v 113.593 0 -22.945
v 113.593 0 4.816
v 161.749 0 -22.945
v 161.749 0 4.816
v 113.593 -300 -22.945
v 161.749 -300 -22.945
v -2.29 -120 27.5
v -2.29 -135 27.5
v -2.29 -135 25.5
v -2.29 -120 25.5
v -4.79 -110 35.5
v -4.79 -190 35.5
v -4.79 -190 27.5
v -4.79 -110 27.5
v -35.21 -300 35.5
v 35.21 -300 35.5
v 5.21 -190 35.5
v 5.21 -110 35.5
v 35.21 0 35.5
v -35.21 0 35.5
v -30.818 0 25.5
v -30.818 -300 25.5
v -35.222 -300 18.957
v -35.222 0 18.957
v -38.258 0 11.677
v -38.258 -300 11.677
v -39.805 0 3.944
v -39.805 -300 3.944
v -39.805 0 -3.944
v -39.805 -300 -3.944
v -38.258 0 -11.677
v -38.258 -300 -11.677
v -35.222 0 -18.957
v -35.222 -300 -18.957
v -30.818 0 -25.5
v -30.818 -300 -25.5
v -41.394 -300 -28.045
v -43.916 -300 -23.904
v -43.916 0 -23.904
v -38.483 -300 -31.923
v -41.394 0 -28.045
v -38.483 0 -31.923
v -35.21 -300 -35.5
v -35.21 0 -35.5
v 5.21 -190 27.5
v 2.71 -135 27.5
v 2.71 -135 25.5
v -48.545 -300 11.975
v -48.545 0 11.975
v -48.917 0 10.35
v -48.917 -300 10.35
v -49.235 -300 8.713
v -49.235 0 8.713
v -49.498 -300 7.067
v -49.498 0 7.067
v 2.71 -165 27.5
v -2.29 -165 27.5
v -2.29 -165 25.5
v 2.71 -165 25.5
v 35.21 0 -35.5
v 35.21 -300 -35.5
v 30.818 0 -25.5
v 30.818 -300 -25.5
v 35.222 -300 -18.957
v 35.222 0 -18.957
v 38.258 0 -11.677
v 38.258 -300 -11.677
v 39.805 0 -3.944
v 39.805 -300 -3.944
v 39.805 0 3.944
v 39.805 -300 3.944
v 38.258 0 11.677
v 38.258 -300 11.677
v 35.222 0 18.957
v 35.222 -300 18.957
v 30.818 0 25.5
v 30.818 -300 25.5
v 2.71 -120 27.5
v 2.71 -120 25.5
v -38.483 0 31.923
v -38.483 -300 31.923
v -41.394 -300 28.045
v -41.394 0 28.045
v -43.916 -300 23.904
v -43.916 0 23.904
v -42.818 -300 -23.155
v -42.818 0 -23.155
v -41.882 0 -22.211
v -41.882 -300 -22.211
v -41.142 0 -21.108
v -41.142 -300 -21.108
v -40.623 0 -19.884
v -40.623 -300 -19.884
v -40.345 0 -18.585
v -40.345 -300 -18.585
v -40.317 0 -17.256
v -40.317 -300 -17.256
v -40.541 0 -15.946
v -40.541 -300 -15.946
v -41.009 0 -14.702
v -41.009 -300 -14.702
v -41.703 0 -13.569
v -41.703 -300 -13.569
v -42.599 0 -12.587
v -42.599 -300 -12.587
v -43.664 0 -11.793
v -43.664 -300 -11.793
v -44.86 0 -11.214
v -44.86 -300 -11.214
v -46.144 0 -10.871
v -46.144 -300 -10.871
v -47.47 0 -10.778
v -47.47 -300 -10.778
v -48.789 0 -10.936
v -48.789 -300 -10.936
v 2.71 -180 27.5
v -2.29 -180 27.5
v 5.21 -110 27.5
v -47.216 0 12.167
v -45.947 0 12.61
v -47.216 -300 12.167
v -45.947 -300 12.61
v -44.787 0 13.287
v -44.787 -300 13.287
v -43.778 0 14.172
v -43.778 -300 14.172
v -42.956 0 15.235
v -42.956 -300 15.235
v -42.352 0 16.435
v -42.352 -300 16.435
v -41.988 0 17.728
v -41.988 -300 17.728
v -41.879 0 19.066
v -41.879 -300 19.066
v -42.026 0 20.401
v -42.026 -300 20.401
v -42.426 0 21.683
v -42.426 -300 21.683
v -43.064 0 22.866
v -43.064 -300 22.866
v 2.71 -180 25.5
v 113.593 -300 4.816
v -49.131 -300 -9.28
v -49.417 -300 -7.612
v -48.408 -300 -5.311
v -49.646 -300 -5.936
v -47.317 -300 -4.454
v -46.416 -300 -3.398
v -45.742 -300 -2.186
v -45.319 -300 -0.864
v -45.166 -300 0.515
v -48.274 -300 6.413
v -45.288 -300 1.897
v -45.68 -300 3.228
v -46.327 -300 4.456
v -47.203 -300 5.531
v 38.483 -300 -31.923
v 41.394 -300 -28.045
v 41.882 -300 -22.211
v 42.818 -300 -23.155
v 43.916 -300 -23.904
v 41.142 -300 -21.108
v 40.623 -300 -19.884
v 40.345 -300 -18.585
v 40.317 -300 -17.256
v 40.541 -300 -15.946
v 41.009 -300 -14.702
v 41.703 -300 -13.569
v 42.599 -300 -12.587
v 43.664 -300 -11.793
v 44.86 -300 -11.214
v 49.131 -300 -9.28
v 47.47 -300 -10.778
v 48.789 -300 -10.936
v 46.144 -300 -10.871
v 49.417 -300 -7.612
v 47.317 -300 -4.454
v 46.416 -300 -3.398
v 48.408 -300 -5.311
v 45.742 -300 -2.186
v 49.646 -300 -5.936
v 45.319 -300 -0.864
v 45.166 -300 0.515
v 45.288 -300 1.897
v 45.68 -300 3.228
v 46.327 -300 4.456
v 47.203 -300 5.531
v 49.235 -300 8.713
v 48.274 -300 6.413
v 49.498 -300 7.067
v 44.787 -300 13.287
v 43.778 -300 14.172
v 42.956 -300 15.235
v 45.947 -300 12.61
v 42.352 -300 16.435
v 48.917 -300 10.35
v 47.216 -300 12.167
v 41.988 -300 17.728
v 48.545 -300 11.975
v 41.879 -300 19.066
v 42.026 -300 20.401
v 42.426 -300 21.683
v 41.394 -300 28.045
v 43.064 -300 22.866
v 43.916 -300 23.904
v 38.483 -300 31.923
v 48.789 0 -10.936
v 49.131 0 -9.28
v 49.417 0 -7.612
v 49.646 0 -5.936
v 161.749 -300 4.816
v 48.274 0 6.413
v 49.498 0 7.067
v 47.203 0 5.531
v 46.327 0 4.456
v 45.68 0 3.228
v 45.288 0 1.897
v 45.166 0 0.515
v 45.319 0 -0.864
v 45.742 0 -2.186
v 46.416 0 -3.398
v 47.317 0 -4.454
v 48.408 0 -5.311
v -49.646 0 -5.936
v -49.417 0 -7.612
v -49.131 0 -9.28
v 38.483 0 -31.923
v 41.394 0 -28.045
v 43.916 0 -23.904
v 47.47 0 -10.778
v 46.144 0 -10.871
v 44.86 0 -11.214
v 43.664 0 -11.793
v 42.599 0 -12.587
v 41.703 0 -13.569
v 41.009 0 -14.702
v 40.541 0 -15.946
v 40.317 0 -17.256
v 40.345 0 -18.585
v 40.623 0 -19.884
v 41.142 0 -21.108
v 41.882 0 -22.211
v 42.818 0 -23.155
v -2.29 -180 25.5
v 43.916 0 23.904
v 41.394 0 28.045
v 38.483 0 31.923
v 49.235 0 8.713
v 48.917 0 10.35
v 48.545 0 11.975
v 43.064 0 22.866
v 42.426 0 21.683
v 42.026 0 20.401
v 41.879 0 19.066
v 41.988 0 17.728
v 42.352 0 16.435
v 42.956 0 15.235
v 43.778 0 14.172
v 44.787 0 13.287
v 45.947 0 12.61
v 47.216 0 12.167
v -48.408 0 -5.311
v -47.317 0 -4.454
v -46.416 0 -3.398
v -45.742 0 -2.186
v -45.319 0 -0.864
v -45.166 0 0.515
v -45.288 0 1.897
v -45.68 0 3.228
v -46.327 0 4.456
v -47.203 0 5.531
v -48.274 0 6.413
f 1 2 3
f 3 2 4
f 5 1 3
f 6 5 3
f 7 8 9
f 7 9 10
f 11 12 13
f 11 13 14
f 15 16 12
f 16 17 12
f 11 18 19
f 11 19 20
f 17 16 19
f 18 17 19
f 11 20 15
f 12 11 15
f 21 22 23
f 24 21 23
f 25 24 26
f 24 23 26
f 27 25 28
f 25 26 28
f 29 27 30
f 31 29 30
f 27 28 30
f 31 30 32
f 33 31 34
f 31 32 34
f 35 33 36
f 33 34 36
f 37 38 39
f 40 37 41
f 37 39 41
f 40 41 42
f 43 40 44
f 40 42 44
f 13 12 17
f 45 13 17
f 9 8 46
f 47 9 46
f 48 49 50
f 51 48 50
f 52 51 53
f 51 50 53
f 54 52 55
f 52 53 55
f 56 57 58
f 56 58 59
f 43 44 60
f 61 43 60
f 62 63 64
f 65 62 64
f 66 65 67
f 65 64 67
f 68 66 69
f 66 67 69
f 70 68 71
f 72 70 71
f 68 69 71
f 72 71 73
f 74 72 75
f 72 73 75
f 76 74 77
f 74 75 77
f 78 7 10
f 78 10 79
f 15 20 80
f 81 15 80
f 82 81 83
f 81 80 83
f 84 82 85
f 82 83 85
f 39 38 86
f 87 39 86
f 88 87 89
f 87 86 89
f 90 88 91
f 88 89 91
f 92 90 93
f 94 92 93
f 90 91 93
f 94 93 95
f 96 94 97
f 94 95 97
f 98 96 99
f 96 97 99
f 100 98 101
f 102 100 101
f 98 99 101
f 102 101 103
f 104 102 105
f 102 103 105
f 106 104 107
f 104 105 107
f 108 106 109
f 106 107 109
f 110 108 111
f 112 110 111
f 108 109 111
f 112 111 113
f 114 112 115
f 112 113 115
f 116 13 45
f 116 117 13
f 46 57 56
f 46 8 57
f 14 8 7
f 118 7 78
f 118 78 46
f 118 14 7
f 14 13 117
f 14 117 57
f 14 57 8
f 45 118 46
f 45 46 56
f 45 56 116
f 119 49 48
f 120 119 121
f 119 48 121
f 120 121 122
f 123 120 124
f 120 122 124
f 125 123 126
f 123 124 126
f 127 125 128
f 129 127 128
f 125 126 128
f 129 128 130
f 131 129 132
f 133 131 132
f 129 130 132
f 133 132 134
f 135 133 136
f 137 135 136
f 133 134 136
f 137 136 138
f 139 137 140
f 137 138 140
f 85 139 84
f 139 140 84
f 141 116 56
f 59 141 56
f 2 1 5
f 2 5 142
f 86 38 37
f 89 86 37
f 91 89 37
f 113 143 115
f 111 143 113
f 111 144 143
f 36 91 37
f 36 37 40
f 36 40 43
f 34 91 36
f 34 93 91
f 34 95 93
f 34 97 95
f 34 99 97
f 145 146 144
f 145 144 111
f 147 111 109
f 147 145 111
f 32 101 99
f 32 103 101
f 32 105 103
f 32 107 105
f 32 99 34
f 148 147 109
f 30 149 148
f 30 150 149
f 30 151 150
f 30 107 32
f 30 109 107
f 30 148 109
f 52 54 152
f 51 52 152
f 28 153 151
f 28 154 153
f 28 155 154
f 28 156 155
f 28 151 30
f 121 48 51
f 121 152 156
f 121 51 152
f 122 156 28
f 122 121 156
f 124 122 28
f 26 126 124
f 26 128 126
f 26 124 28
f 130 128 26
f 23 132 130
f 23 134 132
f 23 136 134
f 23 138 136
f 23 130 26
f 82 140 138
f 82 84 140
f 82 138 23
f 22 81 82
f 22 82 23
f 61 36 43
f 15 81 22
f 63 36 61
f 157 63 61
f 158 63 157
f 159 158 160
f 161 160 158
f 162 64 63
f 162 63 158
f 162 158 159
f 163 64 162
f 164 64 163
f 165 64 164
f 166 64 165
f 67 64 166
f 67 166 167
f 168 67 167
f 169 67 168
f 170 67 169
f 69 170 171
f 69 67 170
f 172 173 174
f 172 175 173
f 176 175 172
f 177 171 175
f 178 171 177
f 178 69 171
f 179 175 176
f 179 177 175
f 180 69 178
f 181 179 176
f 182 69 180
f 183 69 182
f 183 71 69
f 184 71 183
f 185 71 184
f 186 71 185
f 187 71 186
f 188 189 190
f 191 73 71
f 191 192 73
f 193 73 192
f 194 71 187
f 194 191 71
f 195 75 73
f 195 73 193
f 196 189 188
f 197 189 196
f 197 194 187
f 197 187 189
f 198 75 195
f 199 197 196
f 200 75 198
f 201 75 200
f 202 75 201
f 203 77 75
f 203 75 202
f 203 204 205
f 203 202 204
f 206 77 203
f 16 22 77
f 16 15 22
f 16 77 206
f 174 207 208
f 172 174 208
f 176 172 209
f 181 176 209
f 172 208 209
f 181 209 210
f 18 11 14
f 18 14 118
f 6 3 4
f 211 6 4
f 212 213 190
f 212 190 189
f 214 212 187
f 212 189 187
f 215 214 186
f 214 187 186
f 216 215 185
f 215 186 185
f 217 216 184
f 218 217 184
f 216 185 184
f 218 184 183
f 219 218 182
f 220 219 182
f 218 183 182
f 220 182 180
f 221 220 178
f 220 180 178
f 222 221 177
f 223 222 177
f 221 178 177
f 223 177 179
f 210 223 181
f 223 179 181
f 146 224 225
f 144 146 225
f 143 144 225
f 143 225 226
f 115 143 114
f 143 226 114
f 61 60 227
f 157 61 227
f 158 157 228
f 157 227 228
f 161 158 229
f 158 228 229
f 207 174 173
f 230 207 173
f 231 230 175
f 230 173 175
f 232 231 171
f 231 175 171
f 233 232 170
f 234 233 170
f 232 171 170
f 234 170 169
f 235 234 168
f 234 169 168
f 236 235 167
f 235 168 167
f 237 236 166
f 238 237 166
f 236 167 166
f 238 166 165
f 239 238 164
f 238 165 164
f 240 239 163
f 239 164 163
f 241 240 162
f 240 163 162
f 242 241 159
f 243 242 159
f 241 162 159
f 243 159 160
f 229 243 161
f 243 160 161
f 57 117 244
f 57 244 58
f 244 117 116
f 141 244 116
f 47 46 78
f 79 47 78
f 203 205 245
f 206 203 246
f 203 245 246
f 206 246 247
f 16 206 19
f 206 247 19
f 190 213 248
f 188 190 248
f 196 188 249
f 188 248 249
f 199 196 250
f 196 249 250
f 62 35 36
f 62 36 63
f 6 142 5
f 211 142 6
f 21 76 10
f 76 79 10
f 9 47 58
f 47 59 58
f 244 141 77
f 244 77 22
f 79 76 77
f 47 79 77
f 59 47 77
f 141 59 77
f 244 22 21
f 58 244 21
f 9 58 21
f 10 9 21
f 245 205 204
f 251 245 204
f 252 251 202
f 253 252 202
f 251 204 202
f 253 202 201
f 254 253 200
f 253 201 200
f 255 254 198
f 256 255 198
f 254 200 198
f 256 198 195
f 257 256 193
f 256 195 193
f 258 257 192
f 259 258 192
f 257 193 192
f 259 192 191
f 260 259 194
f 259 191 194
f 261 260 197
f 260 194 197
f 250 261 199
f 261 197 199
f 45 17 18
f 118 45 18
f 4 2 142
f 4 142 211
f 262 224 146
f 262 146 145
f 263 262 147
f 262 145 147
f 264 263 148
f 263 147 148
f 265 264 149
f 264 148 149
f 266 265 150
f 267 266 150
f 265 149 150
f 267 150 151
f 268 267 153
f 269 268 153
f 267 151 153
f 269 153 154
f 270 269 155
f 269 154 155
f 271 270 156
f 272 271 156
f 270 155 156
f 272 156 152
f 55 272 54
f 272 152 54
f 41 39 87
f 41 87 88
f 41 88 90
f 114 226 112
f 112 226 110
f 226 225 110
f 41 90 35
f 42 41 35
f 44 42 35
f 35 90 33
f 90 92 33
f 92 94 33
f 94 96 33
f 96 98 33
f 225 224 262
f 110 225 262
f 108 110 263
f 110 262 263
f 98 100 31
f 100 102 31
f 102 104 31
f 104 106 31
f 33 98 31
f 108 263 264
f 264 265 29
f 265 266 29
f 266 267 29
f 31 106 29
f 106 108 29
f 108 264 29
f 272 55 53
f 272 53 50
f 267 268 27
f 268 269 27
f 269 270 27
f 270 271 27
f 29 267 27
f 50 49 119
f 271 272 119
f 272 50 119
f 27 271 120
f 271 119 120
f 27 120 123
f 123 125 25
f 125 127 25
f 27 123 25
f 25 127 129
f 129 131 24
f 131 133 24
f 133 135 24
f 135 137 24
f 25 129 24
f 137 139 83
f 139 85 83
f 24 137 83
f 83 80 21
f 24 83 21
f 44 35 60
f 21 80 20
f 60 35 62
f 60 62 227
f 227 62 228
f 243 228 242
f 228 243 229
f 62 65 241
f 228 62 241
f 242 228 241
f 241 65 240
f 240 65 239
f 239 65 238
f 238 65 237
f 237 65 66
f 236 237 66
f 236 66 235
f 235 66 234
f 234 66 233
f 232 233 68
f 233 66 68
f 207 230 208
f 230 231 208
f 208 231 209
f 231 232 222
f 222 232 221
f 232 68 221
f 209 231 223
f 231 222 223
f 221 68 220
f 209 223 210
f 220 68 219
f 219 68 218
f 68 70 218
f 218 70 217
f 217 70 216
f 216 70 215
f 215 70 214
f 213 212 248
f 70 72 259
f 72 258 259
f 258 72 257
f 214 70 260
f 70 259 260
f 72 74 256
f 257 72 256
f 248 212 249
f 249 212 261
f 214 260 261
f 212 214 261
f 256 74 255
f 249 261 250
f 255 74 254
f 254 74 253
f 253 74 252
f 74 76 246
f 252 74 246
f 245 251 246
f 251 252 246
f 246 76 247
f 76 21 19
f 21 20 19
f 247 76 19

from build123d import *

# Parameters (mm, degrees)
F0_W     = 48.156478
F0_H     = 27.760793
F1_DEPTH = 300
F3_DEPTH = 300
F4_W     = 10
F4_H     = 80
F5_DEPTH = 8
F6_W     = 5
F6_H     = 15
F7_DEPTH = 5
F9_DEPTH = 300


with BuildPart() as f1:
    # F0 (on Front) → F1 (new body)
    with BuildSketch(Plane.XZ):
        with BuildLine():
            Line((35.210084, 35.5), (-35.210084, 35.5))
            ThreePointArc((-35.210084, 35.5), (-50, 0), (-35.210084, -35.5))
            Line((-35.210084, -35.5), (35.210084, -35.5))
            ThreePointArc((35.210084, -35.5), (50, 0), (35.210084, 35.5))
        make_face()
        with Locations((137.670871, -9.064749)):
            Rectangle(F0_W, F0_H)
    extrude(amount=F1_DEPTH)

    # F2 (on face) → F3 (cut)
    with BuildSketch(Plane.XZ.offset(300)):
        with BuildLine():
            Line((30.818014, 25.5), (-30.818014, 25.5))
            ThreePointArc((-30.818014, 25.5), (-40, 0), (-30.818014, -25.5))
            Line((-30.818014, -25.5), (30.818014, -25.5))
            ThreePointArc((30.818014, -25.5), (40, 0), (30.818014, 25.5))
        make_face()
    extrude(amount=-F3_DEPTH, mode=Mode.SUBTRACT)

    # F4 (on face) → F5 (cut)
    with BuildSketch(Plane.XY.offset(35.5)):
        with Locations((0.210084, -150)):
            Rectangle(F4_W, F4_H)
    extrude(amount=-F5_DEPTH, mode=Mode.SUBTRACT)

    # F6 (on face) → F7 (cut)
    with BuildSketch(Plane.XY.offset(27.5)):
        with Locations((0.210084, -127.5)):
            Rectangle(F6_W, F6_H)
        with Locations((0.210084, -172.5)):
            Rectangle(F6_W, F6_H)
    extrude(amount=-F7_DEPTH, mode=Mode.SUBTRACT)

    # F8 (on face) → F9 (cut)
    with BuildSketch(Plane.XZ.offset(300)):
        with BuildLine():
            ThreePointArc((48.544861, 11.974828), (47.232473, 18.328418), (43.915699, 23.904213))
            ThreePointArc((43.915699, 23.904213), (42.351965, 16.434552), (48.544861, 11.974828))
        make_face()
        with BuildLine():
            ThreePointArc((49.646362, -5.936223), (52.468789, 0.598181), (49.498121, 7.06654))
            ThreePointArc((49.498121, 7.06654), (45.166086, 0.514925), (49.646362, -5.936223))
        make_face()
        with BuildLine():
            ThreePointArc((43.915699, -23.904213), (49.497466, -18.602155), (48.789333, -10.936223))
            ThreePointArc((48.789333, -10.936223), (40.745247, -15.312893), (43.915699, -23.904213))
        make_face()
        with BuildLine():
            ThreePointArc((-48.544861, 11.974828), (-42.351965, 16.434552), (-43.915699, 23.904213))
            ThreePointArc((-43.915699, 23.904213), (-47.232473, 18.328418), (-48.544861, 11.974828))
        make_face()
        with BuildLine():
            ThreePointArc((-49.646362, -5.936223), (-45.166086, 0.514925), (-49.498121, 7.06654))
            ThreePointArc((-49.498121, 7.06654), (-52.468789, 0.598181), (-49.646362, -5.936223))
        make_face()
        with BuildLine():
            ThreePointArc((-43.915699, -23.904213), (-40.745247, -15.312893), (-48.789333, -10.936223))
            ThreePointArc((-48.789333, -10.936223), (-49.497466, -18.602155), (-43.915699, -23.904213))
        make_face()
    extrude(amount=-F9_DEPTH, mode=Mode.SUBTRACT)


solid = f1.part
